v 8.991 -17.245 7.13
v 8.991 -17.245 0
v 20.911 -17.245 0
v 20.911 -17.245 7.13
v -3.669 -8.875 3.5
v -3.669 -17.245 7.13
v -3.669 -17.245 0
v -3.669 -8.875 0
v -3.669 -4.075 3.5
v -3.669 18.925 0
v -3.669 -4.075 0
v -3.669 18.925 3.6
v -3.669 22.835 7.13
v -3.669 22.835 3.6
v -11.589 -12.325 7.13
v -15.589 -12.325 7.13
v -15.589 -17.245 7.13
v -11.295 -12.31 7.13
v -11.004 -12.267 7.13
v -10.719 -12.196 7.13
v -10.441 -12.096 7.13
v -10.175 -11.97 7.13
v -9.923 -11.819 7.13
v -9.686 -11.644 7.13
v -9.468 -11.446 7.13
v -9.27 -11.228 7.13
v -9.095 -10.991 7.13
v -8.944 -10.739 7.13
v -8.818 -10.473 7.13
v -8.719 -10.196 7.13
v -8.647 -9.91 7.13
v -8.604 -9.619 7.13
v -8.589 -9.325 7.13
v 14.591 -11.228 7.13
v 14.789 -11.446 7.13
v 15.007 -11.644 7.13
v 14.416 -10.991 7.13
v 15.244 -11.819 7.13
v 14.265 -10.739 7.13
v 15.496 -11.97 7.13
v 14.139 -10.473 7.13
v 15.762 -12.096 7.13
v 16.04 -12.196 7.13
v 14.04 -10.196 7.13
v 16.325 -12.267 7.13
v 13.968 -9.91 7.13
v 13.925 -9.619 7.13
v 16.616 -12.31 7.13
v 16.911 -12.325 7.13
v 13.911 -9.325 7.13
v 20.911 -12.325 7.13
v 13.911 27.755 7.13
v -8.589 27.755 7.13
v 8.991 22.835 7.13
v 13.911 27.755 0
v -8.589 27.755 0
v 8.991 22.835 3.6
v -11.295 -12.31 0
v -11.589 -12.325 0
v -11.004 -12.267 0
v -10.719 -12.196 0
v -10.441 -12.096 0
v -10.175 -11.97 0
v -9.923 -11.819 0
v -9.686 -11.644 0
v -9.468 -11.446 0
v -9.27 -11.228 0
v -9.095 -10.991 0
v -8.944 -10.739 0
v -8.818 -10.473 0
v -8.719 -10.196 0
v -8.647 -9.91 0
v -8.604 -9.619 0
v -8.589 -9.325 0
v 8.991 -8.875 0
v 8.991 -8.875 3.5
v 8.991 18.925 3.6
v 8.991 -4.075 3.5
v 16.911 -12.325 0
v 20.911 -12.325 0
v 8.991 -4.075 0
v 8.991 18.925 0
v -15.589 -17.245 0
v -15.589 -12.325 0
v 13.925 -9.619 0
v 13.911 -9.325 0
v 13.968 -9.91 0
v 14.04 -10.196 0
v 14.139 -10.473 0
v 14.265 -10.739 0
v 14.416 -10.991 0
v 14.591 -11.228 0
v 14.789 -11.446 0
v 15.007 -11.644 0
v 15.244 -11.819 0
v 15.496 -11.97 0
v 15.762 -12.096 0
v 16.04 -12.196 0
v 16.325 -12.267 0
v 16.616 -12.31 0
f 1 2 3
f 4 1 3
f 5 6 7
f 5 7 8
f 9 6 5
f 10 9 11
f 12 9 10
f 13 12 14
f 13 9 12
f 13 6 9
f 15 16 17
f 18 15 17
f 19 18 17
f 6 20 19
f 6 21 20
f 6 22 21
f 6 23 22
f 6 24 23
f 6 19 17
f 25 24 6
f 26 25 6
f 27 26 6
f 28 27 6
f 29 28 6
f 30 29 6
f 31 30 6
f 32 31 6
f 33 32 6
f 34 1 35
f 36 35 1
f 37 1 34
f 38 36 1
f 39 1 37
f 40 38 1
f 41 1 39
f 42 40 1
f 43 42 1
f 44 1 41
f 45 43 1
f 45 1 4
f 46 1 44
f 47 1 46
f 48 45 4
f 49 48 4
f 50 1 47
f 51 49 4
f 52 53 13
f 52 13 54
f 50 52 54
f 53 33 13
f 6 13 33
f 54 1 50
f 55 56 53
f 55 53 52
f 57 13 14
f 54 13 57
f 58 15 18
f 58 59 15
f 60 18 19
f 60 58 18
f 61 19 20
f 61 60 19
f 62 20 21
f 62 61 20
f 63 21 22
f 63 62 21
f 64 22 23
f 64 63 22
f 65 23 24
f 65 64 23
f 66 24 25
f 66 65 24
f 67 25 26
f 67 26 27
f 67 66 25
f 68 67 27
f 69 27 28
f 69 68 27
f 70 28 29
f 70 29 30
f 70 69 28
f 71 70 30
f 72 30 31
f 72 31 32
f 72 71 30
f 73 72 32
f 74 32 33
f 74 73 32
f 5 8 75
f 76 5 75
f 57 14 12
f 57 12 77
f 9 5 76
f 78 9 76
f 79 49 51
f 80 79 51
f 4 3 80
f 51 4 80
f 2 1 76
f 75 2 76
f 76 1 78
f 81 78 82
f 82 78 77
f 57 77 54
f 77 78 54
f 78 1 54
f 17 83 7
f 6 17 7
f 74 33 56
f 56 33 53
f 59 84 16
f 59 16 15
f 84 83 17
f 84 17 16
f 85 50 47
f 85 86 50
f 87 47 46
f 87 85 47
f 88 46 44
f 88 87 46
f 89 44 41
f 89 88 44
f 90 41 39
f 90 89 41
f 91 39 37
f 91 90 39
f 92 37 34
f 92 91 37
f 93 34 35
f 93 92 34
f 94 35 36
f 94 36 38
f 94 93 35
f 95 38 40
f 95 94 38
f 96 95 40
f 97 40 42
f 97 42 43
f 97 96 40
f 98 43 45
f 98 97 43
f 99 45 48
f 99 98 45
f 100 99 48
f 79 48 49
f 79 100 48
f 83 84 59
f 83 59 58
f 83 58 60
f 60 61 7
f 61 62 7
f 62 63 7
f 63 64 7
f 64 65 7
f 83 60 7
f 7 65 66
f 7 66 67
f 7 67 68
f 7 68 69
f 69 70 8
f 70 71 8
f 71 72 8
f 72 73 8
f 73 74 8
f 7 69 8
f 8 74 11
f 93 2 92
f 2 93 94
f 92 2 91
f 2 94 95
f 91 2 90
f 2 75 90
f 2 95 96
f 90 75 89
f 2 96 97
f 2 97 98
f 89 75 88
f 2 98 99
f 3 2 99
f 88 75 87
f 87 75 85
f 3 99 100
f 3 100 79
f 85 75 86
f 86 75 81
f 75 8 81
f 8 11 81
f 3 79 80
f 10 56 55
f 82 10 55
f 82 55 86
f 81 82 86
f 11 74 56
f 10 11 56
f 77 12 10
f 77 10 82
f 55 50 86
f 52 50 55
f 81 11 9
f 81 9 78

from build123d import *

# Parameters (mm, degrees)
F0_W     = 36.5
F0_H     = 45
F1_DEPTH = 7.13
F2_W     = 7
F2_H     = 40.08
F3_DEPTH = 7.13
F4_W     = 12.66
F4_H     = 36.17
F5_DEPTH = 7.13
F6_W     = 12.66
F6_H     = 3.91
F7_DEPTH = 3.53
F8_W     = 12.66
F8_H     = 4.8
F9_DEPTH = 3.5
F10_R    = 3


with BuildPart() as f1:
    # F0 (on Top) → F1 (new body)
    with BuildSketch(Plane.XY):
        with Locations((2.660514, 5.255292)):
            Rectangle(F0_W, F0_H)
    extrude(amount=F1_DEPTH)

    # F2 (on face) → F3 (cut)
    with BuildSketch(Plane.XY.offset(7.13)):
        with Locations((-12.089486, 7.715292)):
            Rectangle(F2_W, F2_H)
        with Locations((17.410514, 7.715292)):
            Rectangle(F2_W, F2_H)
    extrude(amount=-F3_DEPTH, mode=Mode.SUBTRACT)

    # F4 (on face) → F5 (cut)
    with BuildSketch(Plane.XY.offset(7.13)):
        with Locations((2.660514, 0.840292)):
            Rectangle(F4_W, F4_H)
    extrude(amount=-F5_DEPTH, mode=Mode.SUBTRACT)

    # F6 (on face) → F7 (cut)
    with BuildSketch(Plane.XY.offset(7.13)):
        with Locations((2.660514, 20.880292)):
            Rectangle(F6_W, F6_H)
    extrude(amount=-F7_DEPTH, mode=Mode.SUBTRACT)

    # F8 (on face) → F9 (join)
    with BuildSketch(Plane(origin=(0, 0, 0), x_dir=(1, 0, 0), z_dir=(0, 0, -1))):
        with Locations((2.660514, 6.474708)):
            Rectangle(F8_W, F8_H)
    extrude(amount=-F9_DEPTH)

    # F10
    f10_edges = [f1.edges().sort_by_distance(p)[0] for p in [
        (13.910514, -12.324708, 3.565),
        (-8.589486, -12.324708, 3.565),
    ]]
    fillet(f10_edges, radius=F10_R)


solid = f1.part
